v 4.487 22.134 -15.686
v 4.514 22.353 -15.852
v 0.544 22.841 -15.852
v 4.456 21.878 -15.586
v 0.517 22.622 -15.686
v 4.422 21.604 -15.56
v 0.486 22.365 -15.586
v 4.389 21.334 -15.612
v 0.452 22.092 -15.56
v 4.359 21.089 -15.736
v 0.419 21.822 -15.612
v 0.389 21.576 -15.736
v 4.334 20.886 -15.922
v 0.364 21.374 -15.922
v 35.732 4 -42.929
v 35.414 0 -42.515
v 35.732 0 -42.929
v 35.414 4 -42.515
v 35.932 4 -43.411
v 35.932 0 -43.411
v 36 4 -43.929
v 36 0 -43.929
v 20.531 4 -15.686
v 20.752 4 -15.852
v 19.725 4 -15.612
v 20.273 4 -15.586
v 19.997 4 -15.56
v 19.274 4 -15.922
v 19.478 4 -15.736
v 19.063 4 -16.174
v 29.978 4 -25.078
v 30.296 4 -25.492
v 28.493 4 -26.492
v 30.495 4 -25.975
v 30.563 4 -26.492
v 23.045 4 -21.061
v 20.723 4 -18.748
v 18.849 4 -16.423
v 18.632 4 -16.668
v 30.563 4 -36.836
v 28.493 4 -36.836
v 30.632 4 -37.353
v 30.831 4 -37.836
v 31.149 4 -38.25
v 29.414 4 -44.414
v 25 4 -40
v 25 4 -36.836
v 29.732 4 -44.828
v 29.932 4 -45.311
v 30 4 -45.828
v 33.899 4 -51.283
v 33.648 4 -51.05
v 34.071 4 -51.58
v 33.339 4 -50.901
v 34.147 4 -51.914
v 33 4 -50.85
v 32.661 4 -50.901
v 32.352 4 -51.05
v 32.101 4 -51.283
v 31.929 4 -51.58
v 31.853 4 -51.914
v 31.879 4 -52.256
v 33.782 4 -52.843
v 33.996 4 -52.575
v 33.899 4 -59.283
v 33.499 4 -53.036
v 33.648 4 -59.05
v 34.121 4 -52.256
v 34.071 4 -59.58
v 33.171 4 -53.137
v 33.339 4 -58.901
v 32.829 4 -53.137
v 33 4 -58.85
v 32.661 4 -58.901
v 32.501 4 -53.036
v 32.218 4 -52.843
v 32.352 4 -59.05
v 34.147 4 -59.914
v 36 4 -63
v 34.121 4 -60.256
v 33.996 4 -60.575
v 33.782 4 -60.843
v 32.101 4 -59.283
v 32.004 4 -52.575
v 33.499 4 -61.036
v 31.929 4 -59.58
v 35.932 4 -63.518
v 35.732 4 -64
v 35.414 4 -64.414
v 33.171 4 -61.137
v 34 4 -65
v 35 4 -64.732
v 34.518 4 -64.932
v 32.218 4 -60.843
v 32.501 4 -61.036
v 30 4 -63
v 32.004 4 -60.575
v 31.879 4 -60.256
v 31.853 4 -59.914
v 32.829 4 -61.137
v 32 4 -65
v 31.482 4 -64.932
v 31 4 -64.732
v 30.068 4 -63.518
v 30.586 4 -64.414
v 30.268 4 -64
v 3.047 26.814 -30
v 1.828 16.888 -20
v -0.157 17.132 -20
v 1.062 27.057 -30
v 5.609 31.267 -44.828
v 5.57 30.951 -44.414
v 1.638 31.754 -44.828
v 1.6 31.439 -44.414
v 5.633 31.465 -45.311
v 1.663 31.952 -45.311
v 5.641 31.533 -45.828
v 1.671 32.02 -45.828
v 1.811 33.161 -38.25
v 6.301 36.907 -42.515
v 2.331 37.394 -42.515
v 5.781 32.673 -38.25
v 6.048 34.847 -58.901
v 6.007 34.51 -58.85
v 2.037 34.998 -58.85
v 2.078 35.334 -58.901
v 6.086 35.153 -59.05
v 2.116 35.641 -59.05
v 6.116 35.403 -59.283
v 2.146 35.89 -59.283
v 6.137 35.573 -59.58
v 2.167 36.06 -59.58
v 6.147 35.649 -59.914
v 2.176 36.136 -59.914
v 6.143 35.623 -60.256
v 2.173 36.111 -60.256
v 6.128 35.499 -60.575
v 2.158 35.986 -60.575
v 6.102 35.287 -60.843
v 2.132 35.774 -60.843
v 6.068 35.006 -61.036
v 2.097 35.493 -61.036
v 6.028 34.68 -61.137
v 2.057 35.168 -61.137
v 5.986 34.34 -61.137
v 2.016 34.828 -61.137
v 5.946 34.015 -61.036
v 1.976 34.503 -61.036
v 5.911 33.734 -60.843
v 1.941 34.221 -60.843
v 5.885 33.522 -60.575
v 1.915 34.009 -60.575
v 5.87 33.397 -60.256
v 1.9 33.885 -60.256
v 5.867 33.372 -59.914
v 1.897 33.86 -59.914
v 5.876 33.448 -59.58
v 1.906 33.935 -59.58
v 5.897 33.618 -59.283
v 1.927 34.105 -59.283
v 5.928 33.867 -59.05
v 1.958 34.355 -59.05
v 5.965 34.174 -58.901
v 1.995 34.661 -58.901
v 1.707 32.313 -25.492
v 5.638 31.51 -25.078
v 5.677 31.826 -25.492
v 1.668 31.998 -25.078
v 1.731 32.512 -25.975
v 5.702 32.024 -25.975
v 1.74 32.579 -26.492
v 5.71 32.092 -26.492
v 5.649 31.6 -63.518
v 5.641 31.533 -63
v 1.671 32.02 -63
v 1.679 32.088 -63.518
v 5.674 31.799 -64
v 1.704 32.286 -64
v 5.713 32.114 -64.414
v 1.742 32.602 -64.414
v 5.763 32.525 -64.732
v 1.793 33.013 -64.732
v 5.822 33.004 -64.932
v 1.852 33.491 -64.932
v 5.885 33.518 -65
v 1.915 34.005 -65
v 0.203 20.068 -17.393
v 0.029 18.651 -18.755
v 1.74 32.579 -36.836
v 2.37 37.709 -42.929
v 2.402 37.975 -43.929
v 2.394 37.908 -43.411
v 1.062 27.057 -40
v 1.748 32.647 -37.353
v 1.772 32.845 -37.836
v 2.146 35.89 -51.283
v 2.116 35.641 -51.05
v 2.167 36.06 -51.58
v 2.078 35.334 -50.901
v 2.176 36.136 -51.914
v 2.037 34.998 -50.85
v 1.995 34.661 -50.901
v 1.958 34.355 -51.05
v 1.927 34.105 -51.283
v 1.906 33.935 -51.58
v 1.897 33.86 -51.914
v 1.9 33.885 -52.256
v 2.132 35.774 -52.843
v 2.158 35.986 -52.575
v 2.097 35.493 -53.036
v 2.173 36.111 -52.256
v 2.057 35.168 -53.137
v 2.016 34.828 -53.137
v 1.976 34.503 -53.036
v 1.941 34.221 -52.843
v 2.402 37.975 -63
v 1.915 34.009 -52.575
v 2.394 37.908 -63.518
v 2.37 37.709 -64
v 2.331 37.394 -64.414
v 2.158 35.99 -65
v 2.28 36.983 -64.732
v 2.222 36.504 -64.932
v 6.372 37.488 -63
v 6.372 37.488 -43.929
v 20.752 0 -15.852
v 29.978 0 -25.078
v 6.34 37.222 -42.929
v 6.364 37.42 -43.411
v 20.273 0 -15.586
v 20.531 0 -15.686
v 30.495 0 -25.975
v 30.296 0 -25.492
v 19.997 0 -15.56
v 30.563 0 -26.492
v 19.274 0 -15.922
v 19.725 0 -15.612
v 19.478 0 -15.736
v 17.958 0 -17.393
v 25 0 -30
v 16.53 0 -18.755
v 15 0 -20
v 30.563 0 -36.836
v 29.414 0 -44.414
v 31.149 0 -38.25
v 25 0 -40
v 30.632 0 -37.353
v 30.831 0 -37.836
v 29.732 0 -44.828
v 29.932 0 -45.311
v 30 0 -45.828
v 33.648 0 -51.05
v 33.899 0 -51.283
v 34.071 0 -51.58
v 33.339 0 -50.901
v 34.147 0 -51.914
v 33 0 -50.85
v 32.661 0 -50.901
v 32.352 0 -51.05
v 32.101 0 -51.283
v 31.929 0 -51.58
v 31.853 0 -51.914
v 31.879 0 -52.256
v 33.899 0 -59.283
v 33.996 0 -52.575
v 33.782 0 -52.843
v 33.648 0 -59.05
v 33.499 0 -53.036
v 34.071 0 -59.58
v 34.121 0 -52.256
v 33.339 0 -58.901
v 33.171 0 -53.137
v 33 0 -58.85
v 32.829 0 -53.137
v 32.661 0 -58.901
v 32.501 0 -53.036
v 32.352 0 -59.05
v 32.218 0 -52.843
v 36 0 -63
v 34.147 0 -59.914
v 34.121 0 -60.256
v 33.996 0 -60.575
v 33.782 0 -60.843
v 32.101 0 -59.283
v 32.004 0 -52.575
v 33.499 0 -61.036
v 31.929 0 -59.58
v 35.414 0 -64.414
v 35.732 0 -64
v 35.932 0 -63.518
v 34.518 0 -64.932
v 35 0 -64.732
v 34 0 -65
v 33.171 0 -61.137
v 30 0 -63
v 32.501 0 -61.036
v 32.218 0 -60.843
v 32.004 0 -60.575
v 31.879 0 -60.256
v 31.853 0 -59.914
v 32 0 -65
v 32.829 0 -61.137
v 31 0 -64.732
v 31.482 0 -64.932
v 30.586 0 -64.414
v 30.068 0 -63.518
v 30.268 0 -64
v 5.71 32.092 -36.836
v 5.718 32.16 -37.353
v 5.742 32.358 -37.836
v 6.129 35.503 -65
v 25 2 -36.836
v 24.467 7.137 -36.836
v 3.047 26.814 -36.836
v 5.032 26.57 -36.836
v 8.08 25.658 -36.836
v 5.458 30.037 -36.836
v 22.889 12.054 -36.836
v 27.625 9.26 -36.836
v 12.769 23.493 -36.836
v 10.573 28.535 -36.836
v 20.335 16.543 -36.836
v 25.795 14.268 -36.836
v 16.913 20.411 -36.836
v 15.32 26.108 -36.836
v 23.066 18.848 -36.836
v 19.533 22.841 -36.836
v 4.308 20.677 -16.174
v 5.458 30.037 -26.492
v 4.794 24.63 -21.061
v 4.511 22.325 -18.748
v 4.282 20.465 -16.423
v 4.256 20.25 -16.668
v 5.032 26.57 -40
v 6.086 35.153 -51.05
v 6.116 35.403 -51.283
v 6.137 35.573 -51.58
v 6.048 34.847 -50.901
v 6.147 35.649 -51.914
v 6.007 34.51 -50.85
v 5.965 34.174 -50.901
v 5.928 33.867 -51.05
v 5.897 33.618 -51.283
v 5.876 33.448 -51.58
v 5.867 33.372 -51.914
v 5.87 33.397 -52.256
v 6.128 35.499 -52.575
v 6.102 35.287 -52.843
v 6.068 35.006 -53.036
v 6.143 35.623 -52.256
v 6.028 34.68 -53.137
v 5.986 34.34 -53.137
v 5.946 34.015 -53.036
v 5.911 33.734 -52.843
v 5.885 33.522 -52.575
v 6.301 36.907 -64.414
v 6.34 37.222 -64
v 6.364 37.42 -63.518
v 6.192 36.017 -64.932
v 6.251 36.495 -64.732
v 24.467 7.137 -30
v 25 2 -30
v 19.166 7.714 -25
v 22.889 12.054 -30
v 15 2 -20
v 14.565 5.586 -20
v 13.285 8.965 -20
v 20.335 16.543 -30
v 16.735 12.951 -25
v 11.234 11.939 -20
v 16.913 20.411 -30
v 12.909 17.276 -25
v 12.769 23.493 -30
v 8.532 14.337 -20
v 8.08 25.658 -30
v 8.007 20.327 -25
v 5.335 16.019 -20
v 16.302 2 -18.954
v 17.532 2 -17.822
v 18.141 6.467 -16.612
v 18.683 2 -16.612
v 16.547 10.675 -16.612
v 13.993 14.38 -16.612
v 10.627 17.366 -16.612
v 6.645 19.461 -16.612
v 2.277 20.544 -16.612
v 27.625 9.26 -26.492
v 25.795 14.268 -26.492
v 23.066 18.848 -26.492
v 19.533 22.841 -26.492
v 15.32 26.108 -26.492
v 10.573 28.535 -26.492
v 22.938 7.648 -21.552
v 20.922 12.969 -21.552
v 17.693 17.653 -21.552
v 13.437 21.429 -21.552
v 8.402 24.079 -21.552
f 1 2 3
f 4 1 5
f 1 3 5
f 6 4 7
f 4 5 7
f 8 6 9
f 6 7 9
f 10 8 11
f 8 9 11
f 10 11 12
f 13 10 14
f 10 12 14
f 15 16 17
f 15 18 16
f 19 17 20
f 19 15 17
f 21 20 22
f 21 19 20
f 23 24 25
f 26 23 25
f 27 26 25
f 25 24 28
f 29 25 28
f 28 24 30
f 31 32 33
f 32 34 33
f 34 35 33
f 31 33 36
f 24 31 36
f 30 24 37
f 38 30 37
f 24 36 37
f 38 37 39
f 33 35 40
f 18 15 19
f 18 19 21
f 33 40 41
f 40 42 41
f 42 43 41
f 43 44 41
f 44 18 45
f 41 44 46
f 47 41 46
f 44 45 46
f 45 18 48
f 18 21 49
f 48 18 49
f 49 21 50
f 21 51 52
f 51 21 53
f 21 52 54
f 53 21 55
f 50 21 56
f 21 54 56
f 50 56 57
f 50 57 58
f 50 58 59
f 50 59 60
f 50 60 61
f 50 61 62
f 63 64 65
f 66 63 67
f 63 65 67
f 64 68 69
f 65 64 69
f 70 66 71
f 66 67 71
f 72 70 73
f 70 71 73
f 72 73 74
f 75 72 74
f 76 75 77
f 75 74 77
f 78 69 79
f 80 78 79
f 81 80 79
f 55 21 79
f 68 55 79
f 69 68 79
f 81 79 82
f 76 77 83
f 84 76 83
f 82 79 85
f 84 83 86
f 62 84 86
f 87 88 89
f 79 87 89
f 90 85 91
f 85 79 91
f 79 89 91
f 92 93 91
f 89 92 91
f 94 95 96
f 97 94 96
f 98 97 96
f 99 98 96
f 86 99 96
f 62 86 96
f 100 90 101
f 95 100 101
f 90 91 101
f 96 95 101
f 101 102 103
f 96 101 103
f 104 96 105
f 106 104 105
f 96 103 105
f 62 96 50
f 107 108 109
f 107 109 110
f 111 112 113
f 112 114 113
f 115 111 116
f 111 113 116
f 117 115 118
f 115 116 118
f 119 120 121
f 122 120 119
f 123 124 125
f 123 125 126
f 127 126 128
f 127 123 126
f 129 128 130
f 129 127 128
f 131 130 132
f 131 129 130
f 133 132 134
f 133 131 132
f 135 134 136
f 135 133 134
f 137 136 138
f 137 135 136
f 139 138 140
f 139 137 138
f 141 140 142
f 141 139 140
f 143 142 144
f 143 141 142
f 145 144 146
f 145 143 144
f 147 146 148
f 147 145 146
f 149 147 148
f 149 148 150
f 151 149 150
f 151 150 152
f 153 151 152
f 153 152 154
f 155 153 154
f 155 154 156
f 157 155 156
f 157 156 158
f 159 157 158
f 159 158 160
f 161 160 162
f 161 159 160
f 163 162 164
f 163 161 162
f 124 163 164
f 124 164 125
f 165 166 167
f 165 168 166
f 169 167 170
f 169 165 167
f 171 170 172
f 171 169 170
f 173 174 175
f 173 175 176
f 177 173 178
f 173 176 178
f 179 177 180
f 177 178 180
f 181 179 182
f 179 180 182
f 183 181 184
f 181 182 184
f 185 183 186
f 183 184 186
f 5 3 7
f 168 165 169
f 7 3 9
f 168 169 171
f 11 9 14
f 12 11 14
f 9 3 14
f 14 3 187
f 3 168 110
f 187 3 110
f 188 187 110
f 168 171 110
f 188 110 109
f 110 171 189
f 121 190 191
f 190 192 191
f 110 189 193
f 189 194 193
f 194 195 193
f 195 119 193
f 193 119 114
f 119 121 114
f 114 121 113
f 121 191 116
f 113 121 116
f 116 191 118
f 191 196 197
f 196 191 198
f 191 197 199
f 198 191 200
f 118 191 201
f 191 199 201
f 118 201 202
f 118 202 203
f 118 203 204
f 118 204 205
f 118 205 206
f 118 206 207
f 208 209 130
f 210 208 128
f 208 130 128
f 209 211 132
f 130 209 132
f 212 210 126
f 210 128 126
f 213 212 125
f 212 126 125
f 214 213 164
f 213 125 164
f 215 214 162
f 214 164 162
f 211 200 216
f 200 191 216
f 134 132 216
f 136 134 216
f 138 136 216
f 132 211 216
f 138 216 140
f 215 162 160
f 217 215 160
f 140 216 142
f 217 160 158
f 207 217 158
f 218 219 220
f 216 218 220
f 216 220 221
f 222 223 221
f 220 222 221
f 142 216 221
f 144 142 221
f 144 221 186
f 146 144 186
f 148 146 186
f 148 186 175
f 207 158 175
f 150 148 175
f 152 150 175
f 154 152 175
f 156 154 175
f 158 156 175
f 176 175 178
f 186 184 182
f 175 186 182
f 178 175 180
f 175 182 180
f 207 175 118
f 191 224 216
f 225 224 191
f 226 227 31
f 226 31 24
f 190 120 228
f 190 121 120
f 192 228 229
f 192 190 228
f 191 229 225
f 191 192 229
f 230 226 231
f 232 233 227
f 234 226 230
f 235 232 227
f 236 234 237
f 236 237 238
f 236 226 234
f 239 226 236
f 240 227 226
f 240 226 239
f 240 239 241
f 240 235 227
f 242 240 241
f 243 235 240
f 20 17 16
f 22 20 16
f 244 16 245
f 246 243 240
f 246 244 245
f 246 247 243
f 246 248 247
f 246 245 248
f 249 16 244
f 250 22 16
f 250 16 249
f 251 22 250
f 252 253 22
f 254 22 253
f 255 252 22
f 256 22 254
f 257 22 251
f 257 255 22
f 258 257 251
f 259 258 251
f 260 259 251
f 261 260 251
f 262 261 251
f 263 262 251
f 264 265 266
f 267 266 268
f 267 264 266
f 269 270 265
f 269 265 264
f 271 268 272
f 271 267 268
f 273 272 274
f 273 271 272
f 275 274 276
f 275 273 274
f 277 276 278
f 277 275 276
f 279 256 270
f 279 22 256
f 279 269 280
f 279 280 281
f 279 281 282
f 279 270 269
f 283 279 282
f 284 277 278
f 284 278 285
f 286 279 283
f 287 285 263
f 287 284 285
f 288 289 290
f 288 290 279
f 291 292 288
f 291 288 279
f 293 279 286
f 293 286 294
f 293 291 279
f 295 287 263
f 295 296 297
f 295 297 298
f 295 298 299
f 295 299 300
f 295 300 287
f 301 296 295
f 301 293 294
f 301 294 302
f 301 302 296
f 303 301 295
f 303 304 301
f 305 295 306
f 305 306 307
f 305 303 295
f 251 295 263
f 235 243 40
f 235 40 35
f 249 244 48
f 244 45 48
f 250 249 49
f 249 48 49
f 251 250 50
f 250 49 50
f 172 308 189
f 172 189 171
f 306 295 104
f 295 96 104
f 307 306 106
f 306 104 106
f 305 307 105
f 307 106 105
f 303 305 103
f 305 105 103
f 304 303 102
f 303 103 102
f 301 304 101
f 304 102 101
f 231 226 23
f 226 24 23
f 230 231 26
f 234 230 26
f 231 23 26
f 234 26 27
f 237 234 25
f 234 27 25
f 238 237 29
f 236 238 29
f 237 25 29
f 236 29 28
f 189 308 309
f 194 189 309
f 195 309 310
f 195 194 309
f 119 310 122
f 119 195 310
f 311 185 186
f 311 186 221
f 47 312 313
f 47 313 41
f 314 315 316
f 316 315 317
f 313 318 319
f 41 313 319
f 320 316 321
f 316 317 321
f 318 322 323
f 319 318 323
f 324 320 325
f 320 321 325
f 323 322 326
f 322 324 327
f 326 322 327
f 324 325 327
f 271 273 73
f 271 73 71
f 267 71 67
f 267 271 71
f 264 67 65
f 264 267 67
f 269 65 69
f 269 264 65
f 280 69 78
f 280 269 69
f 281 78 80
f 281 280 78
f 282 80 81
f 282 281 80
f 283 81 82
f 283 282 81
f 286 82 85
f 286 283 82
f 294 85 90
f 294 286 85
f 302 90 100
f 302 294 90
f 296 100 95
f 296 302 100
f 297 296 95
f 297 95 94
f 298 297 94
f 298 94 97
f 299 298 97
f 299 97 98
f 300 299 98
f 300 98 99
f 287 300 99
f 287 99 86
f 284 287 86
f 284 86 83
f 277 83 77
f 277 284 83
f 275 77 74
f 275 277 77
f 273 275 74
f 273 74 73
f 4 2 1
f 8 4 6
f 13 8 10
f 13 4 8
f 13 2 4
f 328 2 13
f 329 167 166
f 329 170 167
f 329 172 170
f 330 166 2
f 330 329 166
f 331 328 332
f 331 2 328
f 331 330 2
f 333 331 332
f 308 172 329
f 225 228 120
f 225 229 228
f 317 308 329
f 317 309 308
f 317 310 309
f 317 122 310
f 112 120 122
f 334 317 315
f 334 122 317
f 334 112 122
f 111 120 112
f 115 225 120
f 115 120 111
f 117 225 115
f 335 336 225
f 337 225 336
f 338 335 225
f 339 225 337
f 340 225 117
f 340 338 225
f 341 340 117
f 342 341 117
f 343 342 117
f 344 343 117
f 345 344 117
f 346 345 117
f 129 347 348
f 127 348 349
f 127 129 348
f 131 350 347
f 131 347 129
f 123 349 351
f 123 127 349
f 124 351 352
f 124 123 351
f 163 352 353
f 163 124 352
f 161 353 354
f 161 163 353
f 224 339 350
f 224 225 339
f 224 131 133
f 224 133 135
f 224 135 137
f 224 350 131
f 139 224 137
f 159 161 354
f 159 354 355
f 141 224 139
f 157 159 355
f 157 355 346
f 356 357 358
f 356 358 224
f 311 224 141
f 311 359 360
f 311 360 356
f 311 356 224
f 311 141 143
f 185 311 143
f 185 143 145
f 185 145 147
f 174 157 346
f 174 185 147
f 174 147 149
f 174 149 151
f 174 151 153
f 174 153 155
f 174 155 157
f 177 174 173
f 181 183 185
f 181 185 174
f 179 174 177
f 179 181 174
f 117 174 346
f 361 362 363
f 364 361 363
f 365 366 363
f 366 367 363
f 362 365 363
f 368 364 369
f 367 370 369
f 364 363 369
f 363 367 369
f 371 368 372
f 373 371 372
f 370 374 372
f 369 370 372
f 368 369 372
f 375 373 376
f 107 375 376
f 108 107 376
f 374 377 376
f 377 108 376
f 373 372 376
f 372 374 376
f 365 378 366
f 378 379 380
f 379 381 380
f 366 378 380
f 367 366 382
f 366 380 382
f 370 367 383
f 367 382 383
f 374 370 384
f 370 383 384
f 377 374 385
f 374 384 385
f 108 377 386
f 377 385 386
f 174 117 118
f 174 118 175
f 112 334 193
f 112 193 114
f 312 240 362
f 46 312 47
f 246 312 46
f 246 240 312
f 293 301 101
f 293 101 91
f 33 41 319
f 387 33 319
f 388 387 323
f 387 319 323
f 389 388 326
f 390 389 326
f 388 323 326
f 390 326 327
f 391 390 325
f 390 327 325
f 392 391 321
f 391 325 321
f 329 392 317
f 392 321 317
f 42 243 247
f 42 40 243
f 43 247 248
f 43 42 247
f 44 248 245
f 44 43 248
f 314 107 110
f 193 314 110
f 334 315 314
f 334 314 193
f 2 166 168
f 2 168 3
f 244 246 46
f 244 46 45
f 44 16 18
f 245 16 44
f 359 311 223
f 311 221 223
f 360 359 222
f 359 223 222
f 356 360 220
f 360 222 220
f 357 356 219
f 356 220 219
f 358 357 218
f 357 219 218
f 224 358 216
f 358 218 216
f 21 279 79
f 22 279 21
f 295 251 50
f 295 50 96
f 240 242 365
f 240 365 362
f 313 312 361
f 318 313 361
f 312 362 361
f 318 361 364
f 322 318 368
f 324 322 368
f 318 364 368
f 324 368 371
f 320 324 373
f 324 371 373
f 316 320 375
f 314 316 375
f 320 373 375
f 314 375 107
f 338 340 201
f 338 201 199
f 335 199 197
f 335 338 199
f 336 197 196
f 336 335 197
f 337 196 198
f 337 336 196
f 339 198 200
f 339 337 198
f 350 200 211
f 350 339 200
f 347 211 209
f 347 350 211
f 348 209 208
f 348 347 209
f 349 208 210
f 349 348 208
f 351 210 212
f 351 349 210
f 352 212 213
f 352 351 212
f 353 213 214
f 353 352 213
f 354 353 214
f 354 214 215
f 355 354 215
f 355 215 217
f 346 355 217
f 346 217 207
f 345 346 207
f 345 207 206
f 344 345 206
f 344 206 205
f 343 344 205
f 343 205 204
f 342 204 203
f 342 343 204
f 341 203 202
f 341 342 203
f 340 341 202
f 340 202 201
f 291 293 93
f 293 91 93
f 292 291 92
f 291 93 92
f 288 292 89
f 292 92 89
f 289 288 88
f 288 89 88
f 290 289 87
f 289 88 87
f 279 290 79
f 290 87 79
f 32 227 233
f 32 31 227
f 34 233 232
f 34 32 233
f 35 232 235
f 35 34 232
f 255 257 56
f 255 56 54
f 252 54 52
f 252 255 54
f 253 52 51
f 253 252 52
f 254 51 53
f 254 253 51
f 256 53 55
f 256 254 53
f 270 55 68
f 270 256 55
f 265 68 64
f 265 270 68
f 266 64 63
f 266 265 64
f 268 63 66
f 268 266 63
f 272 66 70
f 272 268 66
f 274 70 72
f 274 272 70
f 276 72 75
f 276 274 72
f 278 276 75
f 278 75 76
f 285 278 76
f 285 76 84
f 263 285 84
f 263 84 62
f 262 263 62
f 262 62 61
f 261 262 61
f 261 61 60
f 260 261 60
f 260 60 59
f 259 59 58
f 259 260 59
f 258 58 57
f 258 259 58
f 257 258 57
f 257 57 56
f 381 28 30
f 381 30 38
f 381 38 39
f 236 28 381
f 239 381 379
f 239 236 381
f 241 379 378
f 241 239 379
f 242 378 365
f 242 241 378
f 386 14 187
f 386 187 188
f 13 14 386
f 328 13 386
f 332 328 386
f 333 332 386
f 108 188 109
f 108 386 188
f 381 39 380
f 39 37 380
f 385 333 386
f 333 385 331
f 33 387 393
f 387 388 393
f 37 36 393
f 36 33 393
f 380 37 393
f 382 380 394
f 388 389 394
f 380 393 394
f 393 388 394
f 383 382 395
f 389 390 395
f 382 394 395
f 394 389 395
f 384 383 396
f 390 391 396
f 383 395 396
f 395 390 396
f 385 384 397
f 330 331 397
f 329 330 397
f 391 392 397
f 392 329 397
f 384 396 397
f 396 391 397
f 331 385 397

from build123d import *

# Parameters (mm, degrees)
SKETCH_1_R                       = 1.15
EXTRUDE_1_DEPTH                  = 4
FILLET_1_R                       = 2
FILLET_2_R                       = 1
REVOLVE_2_ANGLE                  = 83
PATTERN_CIRCULAR_4_COUNT         = 2
PATTERN_CIRCULAR_4_ANGLE         = 83
FILLET_1_OF_PATTERN_CIRCULAR_4_R = 2
FILLET_2_OF_PATTERN_CIRCULAR_4_R = 1


with BuildPart() as part:
    # 草图1 → 凸台-拉伸1 (new body)
    with BuildSketch(Plane(origin=(0, 0, 0), x_dir=(1, 0, 0), z_dir=(0, 1, 0))):
        with BuildLine():
            Line((15, 20), (25, 30))
            Line((25, 30), (25, 40))
            Line((25, 40), (30, 45))
            Line((30, 45), (30, 65))
            Line((30, 65), (36, 65))
            Line((36, 65), (36, 43.100505063))
            Line((36, 43.100505063), (30.563454525, 37.663959588))
            Line((30.563454525, 37.663959588), (30.563454525, 25.663959588))
            Line((30.563454525, 25.663959588), (19.956852807, 15.05735787))
            ThreePointArc((19.956852807, 15.05735787), (17.652275132, 17.7030275), (15, 20))
        make_face()
        with Locations(Location((33, 60, 0), (0, 0, 270))):
            Circle(SKETCH_1_R, mode=Mode.SUBTRACT)
        with Locations(Location((33, 52, 0), (0, 0, 270))):
            Circle(SKETCH_1_R, mode=Mode.SUBTRACT)
    extrude_1 = extrude(amount=EXTRUDE_1_DEPTH)

    # 圆角1
    fillet_1_edges = [part.edges().sort_by_distance(p)[0] for p in [
        (30, 2, -45),
        (30, 2, -65),
        (36, 2, -65),
        (36, 2, -43.100505063),
        (30.563454525, 2, -37.663959588),
        (30.563454525, 2, -25.663959588),
    ]]
    fillet(fillet_1_edges, radius=FILLET_1_R)

    # 圆角2
    fillet_2_edges = [part.edges().sort_by_distance(p)[0] for p in [
        (19.956852807, 2, -15.05735787),
    ]]
    fillet(fillet_2_edges, radius=FILLET_2_R)

    # 草图2 → 旋转2 (revolve)
    with BuildSketch(Plane(origin=(0, 2, 0), x_dir=(1, 0, 0), z_dir=(0, 1, 0))):
        with BuildLine():
            Line((28.563454525, 26.492386713), (28.563454525, 36.835532463))
            Line((28.563454525, 36.835532463), (25, 36.835532463))
            Line((25, 36.835532463), (25, 30))
            Line((25, 30), (15, 20))
            ThreePointArc((15, 20), (16.926416038, 18.398272748), (18.682847286, 16.611779474))
            Line((18.682847286, 16.611779474), (28.563454525, 26.492386713))
        make_face()
    revolve(axis=Axis((0, 2, -67.472032035), (0, 0, 1)), revolution_arc=REVOLVE_2_ANGLE)

    # 阵列(圆周)4: 凸台-拉伸1 ×2 about axis
    pattern_circular_4_axis = Axis((0, 2, 0), (0, 0, 1))
    for i in range(1, PATTERN_CIRCULAR_4_COUNT):
        add(extrude_1.rotate(pattern_circular_4_axis, i * PATTERN_CIRCULAR_4_ANGLE / (PATTERN_CIRCULAR_4_COUNT - 1)))

    # 圆角1 of 阵列(圆周)4
    fillet_1_of_pattern_circular_4_edges = [part.edges().sort_by_distance(p)[0] for p in [
        (3.656080302, 31.776384549, -45),
        (3.656080302, 31.776384549, -65),
        (4.387296363, 37.731661459, -65),
        (4.387296363, 37.731661459, -43.100505063),
        (3.724748135, 32.335639169, -37.663959588),
        (3.724748135, 32.335639169, -25.663959588),
    ]]
    fillet(fillet_1_of_pattern_circular_4_edges, radius=FILLET_1_OF_PATTERN_CIRCULAR_4_R)

    # 圆角2 of 阵列(圆周)4
    fillet_2_of_pattern_circular_4_edges = [part.edges().sort_by_distance(p)[0] for p in [
        (2.432128548, 21.808097452, -15.05735787),
    ]]
    fillet(fillet_2_of_pattern_circular_4_edges, radius=FILLET_2_OF_PATTERN_CIRCULAR_4_R)


solid = part.part
